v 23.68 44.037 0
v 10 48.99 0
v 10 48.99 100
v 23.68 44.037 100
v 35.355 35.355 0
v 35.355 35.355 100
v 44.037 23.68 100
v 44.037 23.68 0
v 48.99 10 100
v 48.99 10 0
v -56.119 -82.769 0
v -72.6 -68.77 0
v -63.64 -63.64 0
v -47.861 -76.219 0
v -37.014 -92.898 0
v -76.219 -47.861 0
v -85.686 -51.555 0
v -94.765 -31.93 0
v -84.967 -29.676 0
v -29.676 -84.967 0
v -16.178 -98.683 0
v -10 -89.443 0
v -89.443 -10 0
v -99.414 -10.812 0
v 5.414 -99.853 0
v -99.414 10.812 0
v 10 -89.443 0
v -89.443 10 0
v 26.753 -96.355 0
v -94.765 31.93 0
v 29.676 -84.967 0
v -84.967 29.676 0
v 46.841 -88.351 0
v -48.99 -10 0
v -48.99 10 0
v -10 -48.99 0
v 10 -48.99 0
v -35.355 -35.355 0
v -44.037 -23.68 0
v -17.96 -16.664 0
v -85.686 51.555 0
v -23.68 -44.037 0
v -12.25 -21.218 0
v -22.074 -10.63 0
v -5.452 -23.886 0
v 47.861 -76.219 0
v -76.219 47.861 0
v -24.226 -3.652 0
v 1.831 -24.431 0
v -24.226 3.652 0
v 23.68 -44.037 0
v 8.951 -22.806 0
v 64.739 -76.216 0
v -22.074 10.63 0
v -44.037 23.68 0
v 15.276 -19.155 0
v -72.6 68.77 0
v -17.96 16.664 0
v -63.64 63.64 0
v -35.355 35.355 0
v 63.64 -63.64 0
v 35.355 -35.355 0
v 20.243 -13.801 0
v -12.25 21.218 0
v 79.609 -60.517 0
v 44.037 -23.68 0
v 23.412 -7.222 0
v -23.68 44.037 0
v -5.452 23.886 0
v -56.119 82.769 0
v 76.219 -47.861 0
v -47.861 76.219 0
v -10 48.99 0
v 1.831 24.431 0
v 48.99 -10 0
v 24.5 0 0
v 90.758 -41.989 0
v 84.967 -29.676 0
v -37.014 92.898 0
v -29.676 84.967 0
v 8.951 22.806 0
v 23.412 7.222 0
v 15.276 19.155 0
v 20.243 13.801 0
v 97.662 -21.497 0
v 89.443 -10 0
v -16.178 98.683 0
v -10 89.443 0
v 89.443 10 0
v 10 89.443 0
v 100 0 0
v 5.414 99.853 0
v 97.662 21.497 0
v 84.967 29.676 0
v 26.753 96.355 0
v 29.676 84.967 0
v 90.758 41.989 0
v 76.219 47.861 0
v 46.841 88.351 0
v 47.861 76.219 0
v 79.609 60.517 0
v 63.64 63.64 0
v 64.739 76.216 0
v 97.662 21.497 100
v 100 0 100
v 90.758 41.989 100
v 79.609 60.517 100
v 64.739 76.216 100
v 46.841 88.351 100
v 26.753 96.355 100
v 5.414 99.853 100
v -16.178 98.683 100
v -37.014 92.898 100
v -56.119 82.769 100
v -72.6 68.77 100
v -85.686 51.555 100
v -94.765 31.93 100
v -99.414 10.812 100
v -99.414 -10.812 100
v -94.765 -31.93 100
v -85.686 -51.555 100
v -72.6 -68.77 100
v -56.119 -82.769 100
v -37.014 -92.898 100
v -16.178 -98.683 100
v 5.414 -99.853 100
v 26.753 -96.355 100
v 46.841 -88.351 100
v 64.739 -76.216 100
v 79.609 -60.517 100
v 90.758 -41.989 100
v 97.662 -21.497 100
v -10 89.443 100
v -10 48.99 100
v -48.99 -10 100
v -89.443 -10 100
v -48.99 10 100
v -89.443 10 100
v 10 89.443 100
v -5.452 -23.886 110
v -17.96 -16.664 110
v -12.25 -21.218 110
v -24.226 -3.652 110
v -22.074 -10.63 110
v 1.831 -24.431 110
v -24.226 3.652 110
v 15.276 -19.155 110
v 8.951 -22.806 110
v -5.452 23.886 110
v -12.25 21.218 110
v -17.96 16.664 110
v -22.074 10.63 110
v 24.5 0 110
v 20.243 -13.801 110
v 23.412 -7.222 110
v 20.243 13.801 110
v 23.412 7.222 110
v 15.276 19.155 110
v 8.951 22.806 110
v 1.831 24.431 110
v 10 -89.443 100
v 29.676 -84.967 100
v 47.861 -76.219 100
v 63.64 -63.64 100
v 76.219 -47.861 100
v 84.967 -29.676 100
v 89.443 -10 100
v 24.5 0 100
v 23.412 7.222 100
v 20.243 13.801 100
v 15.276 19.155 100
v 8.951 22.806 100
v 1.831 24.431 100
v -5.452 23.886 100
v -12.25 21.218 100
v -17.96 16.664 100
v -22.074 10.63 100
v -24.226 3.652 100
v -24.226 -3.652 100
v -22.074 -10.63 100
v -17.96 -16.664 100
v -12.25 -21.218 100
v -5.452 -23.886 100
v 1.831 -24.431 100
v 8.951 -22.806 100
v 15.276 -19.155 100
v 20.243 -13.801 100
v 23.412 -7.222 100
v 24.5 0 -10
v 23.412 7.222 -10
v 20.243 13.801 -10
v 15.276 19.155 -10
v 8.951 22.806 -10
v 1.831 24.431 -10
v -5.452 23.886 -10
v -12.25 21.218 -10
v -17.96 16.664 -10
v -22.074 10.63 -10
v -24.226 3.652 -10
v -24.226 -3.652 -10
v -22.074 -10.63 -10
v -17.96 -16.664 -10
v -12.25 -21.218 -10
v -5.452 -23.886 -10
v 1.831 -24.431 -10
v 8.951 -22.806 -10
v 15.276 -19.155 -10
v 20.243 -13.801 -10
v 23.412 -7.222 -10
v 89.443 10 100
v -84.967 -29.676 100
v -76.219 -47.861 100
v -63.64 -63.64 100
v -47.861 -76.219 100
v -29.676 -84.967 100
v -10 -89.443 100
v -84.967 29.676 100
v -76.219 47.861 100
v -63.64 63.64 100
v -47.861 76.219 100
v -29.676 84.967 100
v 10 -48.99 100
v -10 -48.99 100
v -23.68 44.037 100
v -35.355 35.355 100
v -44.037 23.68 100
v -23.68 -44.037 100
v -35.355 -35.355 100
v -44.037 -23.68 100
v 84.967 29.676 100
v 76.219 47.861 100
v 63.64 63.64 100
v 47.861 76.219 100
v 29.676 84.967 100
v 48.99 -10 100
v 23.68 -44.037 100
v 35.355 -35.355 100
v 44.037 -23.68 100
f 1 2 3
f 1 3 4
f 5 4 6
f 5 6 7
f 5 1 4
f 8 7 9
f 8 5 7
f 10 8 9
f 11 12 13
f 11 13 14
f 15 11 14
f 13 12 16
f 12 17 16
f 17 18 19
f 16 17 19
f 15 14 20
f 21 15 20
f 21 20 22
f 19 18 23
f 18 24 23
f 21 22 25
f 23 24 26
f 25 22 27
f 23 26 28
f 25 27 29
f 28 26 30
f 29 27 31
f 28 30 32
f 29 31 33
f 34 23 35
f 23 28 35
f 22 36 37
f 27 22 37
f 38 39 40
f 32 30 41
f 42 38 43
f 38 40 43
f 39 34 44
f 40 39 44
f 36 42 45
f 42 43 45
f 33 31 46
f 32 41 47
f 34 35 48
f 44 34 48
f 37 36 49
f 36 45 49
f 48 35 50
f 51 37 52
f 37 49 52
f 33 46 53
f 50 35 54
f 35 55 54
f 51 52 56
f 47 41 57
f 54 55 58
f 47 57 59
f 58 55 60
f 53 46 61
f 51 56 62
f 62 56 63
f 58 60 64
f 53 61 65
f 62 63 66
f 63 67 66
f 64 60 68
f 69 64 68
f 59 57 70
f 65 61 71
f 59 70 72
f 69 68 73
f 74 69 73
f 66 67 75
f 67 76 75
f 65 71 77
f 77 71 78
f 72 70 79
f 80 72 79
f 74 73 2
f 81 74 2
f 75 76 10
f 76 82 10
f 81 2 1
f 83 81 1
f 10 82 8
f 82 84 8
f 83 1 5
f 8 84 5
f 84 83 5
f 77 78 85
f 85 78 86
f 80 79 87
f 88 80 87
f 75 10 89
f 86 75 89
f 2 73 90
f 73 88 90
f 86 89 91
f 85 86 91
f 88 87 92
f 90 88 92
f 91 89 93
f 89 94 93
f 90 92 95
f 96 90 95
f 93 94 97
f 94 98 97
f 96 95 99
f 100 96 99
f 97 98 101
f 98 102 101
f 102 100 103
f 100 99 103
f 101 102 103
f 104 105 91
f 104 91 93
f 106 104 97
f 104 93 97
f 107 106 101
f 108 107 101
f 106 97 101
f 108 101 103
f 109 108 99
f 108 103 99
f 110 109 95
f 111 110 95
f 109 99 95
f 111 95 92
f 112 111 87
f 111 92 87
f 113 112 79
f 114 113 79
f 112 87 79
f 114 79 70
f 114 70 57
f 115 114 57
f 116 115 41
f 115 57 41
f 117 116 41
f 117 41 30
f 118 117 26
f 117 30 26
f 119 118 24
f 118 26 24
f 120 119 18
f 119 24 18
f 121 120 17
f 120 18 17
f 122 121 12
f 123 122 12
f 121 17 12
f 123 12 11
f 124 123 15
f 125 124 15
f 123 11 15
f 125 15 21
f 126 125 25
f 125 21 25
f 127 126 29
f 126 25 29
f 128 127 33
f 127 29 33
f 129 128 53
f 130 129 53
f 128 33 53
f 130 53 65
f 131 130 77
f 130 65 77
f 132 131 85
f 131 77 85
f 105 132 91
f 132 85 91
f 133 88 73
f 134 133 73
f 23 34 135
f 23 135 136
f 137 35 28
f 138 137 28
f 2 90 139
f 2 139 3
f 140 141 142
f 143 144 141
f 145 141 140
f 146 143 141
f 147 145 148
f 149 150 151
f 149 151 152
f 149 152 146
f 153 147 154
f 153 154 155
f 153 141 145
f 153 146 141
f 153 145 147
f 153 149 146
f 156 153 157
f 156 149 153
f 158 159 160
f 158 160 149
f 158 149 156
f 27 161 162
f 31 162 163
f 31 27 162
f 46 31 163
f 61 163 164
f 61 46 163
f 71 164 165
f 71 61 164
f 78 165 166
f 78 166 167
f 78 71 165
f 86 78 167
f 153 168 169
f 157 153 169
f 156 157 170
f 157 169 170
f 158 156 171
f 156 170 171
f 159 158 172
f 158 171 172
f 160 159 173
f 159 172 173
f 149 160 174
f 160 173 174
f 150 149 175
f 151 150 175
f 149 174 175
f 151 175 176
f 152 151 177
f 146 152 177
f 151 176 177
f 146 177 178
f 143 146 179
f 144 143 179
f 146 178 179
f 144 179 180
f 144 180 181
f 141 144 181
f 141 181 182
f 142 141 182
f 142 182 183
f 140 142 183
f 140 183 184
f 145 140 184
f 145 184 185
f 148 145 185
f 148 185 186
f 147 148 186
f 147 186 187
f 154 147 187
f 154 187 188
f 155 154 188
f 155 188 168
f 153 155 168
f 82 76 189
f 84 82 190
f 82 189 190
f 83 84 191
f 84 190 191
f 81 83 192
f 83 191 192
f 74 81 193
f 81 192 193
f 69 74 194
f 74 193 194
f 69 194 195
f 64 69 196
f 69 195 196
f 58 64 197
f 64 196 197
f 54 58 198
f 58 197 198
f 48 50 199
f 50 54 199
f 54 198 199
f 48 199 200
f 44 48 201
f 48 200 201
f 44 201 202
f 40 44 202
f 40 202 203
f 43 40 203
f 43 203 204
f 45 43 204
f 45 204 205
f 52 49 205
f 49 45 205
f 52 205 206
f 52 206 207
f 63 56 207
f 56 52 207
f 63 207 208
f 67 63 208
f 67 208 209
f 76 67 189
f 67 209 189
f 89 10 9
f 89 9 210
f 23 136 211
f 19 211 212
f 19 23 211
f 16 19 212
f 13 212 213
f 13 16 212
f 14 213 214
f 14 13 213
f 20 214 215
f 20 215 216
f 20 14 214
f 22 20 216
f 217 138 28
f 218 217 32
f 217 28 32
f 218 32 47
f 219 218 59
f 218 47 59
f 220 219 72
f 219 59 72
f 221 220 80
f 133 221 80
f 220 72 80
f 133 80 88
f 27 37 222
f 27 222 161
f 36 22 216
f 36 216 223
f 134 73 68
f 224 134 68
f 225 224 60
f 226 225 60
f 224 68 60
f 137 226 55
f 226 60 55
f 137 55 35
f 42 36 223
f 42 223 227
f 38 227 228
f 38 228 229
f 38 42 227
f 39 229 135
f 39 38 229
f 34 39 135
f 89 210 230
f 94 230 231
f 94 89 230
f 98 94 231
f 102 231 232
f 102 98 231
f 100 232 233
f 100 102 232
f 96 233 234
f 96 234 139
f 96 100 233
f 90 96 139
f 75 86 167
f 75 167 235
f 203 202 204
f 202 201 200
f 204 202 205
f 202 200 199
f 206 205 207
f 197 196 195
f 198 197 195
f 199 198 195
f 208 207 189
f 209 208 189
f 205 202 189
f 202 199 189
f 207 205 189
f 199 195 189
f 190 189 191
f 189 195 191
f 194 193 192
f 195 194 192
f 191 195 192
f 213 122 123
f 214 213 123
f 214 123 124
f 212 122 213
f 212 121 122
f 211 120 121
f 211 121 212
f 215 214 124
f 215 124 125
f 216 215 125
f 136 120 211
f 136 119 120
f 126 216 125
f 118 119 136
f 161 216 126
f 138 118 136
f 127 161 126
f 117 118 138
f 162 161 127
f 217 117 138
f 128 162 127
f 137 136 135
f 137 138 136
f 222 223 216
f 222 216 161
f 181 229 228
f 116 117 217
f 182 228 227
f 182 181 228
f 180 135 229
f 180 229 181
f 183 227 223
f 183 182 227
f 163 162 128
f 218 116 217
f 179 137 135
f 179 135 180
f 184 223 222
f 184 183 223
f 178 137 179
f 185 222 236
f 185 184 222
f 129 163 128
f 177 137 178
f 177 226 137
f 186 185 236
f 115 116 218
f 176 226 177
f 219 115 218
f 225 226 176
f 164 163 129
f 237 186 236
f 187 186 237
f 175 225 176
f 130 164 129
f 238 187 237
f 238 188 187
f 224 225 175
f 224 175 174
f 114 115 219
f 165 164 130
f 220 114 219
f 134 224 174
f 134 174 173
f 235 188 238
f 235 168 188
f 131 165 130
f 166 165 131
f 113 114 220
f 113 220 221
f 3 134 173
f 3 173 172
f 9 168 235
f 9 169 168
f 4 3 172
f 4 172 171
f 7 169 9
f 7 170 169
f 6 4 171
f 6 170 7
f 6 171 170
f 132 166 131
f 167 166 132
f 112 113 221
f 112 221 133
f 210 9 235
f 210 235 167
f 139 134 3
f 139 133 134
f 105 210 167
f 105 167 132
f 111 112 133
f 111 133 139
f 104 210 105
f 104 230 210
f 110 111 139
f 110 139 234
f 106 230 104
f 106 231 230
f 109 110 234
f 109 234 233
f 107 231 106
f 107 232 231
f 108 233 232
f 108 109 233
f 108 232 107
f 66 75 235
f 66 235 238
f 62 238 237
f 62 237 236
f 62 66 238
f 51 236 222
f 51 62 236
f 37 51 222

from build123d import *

# Parameters (mm, degrees)
SKETCH1_R                = 100
BOSS_EXTRUDE1_DEPTH      = 100
BOSS_EXTRUDE2_DEPTH      = 10
BOSS_EXTRUDE2_DEPTH_BACK = 110
SKETCH2_R                = 24.5


with BuildPart() as part:
    # Sketch1 → Boss-Extrude1 (new body)
    with BuildSketch(Plane.XY):
        Circle(SKETCH1_R)
        with BuildLine():
            Line((-10, 89.4427191), (-10, 48.989794856))
            ThreePointArc((-10, 48.989794856), (-35.355339059, 35.355339059), (-48.989794856, 10))
            Line((-48.989794856, 10), (-89.4427191, 10))
            ThreePointArc((-89.4427191, 10), (-63.639610307, 63.639610307), (-10, 89.4427191))
        make_face(mode=Mode.SUBTRACT)
        with BuildLine():
            Line((10, 89.4427191), (10, 48.989794856))
            ThreePointArc((10, 48.989794856), (35.355339059, 35.355339059), (48.989794856, 10))
            Line((48.989794856, 10), (89.4427191, 10))
            ThreePointArc((89.4427191, 10), (63.639610307, 63.639610307), (10, 89.4427191))
        make_face(mode=Mode.SUBTRACT)
        with BuildLine():
            Line((89.4427191, -10), (48.989794856, -10))
            ThreePointArc((48.989794856, -10), (35.355339059, -35.355339059), (10, -48.989794856))
            Line((10, -48.989794856), (10, -89.4427191))
            ThreePointArc((10, -89.4427191), (63.639610307, -63.639610307), (89.4427191, -10))
        make_face(mode=Mode.SUBTRACT)
        with BuildLine():
            Line((-10, -89.4427191), (-10, -48.989794856))
            ThreePointArc((-10, -48.989794856), (-35.355339059, -35.355339059), (-48.989794856, -10))
            Line((-48.989794856, -10), (-89.4427191, -10))
            ThreePointArc((-89.4427191, -10), (-63.639610307, -63.639610307), (-10, -89.4427191))
        make_face(mode=Mode.SUBTRACT)
    extrude(amount=BOSS_EXTRUDE1_DEPTH)

    # Sketch2 → Boss-Extrude2 (add, two sides: drawn at the far end of the back side and taken through both)
    with BuildSketch(Plane.XY.offset(100).offset(-BOSS_EXTRUDE2_DEPTH_BACK)):
        Circle(SKETCH2_R)
    extrude(amount=BOSS_EXTRUDE2_DEPTH + BOSS_EXTRUDE2_DEPTH_BACK)


solid = part.part
